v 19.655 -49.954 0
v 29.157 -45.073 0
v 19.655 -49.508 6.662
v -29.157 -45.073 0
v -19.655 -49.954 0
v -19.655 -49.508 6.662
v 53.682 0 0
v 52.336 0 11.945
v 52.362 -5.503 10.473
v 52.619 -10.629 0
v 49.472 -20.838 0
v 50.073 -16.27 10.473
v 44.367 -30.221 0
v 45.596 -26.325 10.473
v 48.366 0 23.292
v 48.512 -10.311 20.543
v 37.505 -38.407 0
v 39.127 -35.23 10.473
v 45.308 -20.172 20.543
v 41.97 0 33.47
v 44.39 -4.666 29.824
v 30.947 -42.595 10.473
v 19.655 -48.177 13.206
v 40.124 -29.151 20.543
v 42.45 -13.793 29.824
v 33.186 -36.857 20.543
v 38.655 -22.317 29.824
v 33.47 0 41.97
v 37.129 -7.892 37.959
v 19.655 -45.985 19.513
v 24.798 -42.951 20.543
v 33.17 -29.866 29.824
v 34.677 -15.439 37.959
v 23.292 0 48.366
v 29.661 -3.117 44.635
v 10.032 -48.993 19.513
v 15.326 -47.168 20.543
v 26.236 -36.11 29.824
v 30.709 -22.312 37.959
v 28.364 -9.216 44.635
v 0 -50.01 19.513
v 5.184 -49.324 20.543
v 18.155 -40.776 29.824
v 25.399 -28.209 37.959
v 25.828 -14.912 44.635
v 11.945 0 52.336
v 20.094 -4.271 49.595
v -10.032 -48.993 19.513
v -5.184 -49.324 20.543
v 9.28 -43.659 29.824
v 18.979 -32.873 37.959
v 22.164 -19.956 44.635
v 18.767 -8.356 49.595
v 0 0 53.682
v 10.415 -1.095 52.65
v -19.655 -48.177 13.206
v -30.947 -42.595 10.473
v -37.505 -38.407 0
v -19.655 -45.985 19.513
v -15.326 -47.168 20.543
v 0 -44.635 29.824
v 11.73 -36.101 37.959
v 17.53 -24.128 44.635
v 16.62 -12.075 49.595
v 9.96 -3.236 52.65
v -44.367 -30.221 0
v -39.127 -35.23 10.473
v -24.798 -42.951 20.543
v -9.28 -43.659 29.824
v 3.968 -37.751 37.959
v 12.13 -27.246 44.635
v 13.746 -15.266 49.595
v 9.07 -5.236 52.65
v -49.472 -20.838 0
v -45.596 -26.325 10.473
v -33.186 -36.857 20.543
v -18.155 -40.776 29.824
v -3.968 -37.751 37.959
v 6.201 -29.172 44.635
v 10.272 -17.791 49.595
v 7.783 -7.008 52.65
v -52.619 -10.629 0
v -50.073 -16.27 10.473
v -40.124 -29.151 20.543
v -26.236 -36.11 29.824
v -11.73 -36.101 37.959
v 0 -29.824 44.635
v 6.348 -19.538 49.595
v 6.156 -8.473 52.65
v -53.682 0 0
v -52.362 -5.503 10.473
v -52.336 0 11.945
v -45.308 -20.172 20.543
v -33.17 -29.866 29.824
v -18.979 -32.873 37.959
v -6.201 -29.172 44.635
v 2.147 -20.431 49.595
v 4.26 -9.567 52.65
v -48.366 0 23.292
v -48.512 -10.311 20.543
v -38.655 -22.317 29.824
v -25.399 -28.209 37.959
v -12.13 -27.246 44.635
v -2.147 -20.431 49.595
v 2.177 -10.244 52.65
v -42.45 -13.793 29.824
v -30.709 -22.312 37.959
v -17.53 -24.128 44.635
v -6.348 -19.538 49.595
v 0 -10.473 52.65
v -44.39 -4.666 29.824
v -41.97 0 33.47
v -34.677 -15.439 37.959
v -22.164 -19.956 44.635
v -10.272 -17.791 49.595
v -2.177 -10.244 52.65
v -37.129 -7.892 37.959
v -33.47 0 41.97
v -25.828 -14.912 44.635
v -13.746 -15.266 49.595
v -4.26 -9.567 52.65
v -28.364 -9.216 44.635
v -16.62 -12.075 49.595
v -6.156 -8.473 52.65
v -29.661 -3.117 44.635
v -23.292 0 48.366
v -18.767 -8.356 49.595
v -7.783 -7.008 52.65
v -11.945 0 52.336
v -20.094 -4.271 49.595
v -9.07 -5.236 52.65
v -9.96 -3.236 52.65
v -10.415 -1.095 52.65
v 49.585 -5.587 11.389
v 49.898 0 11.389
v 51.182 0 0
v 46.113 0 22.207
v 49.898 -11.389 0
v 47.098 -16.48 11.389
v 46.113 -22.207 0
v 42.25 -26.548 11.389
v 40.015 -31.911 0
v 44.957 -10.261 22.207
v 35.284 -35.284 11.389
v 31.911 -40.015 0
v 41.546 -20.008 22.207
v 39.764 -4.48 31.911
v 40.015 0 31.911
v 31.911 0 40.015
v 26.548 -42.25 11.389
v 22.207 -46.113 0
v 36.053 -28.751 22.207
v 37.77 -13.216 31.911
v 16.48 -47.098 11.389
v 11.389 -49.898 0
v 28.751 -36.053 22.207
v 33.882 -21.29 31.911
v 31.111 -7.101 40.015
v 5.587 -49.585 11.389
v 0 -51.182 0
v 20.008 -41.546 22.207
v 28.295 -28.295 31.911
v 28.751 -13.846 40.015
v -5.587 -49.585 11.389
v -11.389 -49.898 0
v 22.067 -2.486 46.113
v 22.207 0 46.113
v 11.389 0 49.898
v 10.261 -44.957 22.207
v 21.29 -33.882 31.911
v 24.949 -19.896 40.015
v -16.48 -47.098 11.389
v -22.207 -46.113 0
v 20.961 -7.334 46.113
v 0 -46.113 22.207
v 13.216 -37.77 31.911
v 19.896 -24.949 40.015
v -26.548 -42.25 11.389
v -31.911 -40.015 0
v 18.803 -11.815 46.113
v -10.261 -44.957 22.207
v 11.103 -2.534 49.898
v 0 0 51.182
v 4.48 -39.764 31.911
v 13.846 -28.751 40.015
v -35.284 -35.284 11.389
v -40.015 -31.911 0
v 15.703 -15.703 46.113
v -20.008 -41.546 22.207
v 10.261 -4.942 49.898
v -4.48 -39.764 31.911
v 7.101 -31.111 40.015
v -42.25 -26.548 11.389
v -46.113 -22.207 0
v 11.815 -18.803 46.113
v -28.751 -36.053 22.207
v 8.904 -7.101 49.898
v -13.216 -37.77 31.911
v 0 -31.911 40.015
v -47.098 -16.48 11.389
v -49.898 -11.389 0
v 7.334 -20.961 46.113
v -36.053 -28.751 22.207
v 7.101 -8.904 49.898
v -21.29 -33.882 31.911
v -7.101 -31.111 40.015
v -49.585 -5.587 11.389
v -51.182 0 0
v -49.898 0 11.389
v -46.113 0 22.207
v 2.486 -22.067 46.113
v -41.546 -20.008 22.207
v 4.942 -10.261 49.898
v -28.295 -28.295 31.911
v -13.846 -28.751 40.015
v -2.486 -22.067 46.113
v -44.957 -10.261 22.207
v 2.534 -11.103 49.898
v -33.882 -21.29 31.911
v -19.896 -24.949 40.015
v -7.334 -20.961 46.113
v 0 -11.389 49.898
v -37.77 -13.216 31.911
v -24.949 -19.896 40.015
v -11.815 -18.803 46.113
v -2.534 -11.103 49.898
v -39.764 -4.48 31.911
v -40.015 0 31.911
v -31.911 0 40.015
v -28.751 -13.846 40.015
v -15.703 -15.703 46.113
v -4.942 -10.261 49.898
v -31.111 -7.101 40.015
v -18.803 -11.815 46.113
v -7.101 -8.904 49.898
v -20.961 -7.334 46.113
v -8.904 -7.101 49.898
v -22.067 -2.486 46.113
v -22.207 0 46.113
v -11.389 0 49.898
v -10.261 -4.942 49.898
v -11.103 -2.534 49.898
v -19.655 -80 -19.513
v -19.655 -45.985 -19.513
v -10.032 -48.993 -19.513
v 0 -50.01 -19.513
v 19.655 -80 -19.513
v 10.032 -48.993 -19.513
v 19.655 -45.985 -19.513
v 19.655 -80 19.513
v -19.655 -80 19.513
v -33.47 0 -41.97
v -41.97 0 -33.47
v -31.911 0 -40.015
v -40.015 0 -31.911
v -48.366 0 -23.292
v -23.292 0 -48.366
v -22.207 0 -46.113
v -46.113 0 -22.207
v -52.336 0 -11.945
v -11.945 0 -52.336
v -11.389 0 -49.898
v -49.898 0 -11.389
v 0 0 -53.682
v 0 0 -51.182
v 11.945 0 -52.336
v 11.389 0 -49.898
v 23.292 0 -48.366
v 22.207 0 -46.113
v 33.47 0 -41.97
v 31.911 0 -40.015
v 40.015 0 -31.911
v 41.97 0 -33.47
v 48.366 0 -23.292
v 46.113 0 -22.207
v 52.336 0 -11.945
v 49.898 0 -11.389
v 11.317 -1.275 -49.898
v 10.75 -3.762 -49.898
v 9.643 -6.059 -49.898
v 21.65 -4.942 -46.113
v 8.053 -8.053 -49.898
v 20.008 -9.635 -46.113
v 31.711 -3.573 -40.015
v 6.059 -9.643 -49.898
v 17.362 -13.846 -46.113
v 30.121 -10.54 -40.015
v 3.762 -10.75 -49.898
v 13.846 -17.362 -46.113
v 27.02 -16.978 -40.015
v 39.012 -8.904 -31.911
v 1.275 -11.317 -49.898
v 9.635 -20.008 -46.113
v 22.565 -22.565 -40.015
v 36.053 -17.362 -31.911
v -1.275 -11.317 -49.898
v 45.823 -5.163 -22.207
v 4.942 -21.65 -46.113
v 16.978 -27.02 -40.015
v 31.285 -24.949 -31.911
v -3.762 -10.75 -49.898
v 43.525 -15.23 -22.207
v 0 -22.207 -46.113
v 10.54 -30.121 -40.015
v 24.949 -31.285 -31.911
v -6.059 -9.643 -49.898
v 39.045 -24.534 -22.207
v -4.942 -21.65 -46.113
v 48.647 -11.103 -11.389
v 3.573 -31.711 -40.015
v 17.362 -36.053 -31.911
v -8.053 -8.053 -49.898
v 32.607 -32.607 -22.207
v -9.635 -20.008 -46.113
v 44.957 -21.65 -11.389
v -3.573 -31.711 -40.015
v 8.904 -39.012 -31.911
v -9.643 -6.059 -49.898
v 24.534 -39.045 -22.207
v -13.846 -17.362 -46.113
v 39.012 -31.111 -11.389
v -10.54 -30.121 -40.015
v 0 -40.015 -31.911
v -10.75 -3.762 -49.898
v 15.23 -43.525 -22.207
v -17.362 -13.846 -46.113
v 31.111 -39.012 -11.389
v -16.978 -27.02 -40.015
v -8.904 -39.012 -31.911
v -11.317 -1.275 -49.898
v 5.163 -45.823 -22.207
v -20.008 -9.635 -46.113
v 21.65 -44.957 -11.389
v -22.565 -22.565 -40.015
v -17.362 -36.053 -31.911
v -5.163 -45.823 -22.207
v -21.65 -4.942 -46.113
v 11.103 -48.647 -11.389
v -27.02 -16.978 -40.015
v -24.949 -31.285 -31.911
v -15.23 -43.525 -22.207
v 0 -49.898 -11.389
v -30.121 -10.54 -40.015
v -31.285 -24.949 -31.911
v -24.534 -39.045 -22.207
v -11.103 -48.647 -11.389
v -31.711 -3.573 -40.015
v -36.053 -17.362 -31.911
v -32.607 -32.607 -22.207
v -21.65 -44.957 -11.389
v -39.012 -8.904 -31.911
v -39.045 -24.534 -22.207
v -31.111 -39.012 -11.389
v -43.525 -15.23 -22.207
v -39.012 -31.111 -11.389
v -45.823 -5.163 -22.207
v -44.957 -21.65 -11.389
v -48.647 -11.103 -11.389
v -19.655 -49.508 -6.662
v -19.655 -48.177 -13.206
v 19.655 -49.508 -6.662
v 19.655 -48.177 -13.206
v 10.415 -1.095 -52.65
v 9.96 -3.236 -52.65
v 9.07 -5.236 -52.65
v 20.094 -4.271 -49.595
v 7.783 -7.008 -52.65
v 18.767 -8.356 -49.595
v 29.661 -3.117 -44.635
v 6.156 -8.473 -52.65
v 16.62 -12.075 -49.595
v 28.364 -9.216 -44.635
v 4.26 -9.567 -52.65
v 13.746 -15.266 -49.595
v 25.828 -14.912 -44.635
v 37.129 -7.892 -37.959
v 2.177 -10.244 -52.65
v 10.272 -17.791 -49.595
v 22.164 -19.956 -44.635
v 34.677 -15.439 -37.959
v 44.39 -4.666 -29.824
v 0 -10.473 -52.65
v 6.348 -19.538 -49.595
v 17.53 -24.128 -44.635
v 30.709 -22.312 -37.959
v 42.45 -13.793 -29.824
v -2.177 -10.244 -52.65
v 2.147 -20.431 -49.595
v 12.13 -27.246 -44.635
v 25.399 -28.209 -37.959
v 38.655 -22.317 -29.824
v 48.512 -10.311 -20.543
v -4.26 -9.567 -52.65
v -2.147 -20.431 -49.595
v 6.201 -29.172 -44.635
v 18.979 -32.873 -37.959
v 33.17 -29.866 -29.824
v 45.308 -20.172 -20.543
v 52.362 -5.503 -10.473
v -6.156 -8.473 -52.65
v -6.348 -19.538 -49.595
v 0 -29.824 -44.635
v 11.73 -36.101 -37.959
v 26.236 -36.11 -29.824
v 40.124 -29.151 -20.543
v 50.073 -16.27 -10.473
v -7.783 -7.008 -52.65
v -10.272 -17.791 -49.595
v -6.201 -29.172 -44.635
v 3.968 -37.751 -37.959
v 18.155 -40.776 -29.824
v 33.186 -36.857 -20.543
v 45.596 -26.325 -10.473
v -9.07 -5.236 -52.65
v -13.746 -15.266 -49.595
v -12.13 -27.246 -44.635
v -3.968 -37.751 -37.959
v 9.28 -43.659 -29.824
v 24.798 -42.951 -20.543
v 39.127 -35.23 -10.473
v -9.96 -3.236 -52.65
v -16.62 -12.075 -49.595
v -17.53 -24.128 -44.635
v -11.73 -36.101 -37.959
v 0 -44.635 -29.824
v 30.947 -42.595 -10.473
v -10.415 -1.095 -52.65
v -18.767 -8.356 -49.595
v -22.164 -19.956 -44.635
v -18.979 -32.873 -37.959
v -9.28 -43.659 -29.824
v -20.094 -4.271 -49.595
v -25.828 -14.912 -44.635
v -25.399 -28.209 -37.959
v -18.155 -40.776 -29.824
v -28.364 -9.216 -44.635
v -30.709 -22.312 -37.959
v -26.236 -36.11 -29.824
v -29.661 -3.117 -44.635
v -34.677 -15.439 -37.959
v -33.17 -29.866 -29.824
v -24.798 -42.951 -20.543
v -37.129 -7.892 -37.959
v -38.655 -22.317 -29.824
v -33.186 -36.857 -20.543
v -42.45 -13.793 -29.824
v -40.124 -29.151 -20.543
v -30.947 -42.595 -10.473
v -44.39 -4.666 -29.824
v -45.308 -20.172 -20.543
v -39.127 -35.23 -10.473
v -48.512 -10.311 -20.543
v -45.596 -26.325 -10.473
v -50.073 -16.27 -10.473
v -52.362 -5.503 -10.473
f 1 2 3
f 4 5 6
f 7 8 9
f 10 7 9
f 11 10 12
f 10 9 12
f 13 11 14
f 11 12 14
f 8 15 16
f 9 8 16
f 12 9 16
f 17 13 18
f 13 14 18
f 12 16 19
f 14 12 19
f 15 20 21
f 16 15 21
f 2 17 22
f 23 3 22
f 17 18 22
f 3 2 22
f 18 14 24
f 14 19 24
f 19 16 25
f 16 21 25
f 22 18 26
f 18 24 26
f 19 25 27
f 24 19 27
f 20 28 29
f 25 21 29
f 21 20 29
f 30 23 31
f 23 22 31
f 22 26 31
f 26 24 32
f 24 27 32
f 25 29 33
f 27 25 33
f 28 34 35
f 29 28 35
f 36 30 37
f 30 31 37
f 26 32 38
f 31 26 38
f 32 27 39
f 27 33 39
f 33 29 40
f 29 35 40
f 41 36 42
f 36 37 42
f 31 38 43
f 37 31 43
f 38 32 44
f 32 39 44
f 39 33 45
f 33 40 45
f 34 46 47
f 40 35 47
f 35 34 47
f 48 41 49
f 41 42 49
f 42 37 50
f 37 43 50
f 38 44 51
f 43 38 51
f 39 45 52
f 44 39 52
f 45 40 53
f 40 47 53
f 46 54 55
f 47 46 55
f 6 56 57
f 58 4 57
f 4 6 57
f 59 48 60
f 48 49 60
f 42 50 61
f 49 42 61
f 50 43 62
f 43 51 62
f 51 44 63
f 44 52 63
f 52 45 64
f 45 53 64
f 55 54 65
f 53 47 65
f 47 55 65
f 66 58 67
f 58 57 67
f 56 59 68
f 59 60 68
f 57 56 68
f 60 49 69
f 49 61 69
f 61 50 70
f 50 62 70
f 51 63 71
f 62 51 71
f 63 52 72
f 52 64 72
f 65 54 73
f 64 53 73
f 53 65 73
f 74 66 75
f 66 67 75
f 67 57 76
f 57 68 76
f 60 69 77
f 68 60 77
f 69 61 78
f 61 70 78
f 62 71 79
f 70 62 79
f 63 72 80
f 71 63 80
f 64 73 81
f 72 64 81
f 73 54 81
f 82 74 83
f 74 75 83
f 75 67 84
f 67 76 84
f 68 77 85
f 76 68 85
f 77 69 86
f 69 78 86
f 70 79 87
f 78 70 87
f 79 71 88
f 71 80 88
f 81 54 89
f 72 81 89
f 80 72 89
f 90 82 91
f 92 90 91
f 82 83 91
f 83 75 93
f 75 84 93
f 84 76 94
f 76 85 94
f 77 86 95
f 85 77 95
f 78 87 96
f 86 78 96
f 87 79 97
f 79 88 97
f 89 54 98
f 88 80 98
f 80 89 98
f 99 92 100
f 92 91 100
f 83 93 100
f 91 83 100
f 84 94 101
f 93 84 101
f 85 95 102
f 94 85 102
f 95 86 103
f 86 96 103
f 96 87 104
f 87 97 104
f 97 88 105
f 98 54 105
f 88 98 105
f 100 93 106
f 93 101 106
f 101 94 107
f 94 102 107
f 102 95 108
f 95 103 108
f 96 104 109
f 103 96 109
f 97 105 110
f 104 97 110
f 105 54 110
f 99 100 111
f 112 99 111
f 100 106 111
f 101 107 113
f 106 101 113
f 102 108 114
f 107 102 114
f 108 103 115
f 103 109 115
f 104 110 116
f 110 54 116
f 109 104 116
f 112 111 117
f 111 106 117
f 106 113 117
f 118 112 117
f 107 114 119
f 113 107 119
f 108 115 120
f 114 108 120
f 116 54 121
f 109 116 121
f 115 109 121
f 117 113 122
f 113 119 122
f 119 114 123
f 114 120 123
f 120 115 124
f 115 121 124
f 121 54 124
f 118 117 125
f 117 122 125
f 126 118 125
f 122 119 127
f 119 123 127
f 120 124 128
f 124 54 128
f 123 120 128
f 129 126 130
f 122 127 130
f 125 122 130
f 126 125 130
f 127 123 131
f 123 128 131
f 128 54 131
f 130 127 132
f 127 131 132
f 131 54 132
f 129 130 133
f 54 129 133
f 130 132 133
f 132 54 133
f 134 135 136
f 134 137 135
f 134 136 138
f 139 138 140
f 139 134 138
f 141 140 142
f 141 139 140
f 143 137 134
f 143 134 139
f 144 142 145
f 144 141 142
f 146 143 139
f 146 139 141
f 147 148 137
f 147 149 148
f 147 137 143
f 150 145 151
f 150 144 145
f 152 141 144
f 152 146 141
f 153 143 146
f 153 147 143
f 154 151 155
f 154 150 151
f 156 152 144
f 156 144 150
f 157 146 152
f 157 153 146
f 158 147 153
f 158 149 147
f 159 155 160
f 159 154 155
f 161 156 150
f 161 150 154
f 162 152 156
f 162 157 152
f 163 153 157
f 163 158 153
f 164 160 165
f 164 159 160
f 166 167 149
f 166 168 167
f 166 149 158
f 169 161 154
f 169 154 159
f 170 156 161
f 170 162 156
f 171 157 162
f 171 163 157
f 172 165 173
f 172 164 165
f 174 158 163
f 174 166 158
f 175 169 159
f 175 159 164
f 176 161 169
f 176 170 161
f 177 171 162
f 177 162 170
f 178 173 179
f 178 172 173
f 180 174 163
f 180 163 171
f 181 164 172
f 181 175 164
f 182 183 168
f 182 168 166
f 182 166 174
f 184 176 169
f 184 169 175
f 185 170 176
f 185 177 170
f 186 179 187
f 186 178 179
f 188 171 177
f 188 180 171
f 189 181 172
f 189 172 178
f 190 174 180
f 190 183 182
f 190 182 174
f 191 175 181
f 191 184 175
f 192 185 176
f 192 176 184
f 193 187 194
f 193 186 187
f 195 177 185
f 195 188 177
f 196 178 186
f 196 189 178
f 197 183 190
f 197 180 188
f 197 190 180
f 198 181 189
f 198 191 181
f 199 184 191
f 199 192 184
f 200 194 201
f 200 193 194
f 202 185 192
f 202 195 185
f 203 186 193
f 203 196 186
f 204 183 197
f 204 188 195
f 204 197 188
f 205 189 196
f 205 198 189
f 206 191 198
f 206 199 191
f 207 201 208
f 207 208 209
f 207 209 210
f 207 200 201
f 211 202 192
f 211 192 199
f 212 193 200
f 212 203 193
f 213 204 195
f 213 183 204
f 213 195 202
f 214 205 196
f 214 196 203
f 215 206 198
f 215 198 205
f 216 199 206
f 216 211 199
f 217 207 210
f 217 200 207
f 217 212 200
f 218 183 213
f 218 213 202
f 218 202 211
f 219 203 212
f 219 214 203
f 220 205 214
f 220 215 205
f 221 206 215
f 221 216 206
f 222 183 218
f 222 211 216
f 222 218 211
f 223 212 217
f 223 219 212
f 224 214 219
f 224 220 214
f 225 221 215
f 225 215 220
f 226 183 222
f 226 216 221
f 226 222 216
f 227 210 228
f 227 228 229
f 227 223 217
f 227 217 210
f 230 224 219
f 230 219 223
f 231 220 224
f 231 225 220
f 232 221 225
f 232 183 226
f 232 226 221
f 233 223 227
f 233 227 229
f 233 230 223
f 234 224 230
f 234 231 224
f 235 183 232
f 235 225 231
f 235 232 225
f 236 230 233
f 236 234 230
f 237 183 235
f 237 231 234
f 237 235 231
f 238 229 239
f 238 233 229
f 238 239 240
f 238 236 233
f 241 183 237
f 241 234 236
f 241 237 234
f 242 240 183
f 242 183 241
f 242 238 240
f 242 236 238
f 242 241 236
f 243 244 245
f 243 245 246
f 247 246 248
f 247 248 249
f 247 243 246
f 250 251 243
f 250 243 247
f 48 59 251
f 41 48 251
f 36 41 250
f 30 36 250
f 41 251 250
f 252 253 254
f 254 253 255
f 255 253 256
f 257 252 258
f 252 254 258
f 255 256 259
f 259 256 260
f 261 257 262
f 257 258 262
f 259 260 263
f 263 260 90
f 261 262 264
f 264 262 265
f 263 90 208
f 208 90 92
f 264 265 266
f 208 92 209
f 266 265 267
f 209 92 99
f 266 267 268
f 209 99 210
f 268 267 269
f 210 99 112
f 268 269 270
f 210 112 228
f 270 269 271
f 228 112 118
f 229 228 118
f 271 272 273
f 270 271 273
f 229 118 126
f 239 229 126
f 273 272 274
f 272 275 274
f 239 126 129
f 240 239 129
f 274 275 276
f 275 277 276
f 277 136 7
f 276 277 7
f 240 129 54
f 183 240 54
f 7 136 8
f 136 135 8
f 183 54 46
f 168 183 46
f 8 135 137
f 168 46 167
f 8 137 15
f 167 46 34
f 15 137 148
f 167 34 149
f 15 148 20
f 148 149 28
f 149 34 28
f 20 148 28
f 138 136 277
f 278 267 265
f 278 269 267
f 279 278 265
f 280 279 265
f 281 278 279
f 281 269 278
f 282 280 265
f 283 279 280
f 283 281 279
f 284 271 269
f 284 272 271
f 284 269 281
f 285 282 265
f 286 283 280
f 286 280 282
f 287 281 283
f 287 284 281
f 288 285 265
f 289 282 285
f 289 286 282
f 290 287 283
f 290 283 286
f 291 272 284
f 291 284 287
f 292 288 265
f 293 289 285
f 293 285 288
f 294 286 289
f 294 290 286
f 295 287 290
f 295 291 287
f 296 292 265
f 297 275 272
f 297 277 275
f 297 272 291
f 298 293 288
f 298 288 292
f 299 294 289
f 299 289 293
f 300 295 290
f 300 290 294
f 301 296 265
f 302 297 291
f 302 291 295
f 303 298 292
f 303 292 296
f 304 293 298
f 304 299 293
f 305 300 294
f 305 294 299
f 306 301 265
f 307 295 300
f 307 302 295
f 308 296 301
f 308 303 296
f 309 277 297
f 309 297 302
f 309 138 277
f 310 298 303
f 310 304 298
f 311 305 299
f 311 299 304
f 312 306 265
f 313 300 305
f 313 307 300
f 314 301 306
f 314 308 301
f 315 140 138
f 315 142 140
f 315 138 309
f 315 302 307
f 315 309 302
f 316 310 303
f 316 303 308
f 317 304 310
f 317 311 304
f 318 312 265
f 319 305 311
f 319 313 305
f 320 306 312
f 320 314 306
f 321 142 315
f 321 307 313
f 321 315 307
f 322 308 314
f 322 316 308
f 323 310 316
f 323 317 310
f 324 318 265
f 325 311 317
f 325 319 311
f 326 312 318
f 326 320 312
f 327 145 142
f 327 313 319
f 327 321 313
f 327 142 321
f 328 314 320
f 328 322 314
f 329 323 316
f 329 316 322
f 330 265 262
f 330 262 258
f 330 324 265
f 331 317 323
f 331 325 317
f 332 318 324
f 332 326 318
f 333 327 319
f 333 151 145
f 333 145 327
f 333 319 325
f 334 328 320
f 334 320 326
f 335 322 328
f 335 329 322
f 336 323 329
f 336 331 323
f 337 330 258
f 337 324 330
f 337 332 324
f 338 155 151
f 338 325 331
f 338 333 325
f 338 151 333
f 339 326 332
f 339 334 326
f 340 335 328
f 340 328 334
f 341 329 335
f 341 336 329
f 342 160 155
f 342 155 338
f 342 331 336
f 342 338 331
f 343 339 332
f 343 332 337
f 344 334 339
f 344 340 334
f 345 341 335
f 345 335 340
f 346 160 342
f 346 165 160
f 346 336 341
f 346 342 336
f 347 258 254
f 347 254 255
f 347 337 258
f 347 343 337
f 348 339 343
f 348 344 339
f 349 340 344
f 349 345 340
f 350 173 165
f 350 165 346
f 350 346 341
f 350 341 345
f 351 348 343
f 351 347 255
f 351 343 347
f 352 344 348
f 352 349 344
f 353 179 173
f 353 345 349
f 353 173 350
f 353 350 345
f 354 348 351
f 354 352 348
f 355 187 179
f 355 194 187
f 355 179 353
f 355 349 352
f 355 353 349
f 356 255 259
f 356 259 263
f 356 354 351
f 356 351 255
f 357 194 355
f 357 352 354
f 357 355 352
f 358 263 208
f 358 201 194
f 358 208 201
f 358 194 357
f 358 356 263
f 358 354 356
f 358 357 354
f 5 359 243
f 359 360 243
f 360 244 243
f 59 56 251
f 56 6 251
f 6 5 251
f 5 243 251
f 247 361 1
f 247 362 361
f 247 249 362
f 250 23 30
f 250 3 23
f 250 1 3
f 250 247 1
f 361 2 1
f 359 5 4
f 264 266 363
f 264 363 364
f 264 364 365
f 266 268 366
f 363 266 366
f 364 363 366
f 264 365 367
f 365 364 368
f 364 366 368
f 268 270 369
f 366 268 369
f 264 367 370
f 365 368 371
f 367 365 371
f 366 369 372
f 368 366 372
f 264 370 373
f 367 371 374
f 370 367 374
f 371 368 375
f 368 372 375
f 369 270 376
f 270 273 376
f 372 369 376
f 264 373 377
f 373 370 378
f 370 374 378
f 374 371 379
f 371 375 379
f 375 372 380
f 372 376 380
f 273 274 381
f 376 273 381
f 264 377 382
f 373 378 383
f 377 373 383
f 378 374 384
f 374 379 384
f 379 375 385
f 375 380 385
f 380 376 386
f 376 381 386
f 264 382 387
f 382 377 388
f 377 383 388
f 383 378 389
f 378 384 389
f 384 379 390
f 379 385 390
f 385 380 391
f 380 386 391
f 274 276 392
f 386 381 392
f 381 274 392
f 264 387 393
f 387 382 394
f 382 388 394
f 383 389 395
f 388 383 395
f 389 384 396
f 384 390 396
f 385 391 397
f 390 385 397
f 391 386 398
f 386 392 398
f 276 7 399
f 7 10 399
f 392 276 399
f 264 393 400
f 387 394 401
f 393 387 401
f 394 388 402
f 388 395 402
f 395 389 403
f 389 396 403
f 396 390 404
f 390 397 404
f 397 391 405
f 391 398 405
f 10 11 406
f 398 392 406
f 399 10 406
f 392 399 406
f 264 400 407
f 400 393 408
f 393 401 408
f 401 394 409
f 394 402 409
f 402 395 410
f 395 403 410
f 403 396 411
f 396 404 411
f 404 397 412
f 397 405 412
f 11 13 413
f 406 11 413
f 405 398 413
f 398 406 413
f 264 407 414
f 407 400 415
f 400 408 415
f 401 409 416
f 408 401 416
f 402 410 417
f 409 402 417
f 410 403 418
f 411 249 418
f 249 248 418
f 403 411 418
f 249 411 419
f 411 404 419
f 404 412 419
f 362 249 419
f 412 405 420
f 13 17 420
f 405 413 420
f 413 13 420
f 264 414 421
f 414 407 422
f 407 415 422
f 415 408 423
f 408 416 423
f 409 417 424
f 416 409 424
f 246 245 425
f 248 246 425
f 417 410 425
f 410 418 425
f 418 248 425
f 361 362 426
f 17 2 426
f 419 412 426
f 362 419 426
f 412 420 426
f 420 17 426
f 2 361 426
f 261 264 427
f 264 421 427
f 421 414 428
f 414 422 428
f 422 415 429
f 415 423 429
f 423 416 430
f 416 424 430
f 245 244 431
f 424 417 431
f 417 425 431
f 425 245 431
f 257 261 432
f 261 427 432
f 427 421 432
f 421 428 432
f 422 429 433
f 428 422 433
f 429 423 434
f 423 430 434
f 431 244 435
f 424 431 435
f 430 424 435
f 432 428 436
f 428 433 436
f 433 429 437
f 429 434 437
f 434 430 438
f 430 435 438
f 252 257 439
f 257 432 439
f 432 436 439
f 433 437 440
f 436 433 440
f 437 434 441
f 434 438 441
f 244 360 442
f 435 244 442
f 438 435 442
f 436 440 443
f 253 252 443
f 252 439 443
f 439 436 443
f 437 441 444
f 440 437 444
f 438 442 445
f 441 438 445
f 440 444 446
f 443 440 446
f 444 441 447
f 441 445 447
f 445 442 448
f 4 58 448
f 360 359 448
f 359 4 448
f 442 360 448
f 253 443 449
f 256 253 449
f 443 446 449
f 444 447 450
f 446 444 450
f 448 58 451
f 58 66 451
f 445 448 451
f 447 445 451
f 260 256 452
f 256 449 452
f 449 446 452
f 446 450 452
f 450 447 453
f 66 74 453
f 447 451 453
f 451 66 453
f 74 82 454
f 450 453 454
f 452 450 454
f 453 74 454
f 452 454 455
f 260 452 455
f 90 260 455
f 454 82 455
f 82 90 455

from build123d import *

# Parameters (mm, degrees)
F1_ANGLE = 180
F2_T     = -2.5
F4_W     = 39.3107756972
F4_H     = 39.0258319676


with BuildPart() as f1:
    # F0 (on Front) → F1 (revolve)
    with BuildSketch(Plane.XZ):
        with BuildLine():
            ThreePointArc((0, -53.6816862102), (37.9586843448, -37.9586843448), (53.6816862102, 0))
            ThreePointArc((53.6816862102, 0), (37.9586843448, 37.9586843448), (0, 53.6816862102))
            Line((0, 53.6816862102), (0, -53.6816862102))
        make_face()
    revolve(axis=Axis((0, 0, 0), (0, 0, -1)), revolution_arc=F1_ANGLE)

    # F2
    f2_openings = [f1.faces().sort_by_distance(p)[0] for p in [
        (0, 0, 0),
    ]]
    offset(amount=F2_T, openings=f2_openings)

    # F4 (on offset) → F5 (join, up to the next surface of F1)
    with BuildSketch(Plane.XZ.offset(80)):
        Rectangle(F4_W, F4_H)
    extrude(until=Until.NEXT, dir=(0, 1, 0))


solid = f1.part
